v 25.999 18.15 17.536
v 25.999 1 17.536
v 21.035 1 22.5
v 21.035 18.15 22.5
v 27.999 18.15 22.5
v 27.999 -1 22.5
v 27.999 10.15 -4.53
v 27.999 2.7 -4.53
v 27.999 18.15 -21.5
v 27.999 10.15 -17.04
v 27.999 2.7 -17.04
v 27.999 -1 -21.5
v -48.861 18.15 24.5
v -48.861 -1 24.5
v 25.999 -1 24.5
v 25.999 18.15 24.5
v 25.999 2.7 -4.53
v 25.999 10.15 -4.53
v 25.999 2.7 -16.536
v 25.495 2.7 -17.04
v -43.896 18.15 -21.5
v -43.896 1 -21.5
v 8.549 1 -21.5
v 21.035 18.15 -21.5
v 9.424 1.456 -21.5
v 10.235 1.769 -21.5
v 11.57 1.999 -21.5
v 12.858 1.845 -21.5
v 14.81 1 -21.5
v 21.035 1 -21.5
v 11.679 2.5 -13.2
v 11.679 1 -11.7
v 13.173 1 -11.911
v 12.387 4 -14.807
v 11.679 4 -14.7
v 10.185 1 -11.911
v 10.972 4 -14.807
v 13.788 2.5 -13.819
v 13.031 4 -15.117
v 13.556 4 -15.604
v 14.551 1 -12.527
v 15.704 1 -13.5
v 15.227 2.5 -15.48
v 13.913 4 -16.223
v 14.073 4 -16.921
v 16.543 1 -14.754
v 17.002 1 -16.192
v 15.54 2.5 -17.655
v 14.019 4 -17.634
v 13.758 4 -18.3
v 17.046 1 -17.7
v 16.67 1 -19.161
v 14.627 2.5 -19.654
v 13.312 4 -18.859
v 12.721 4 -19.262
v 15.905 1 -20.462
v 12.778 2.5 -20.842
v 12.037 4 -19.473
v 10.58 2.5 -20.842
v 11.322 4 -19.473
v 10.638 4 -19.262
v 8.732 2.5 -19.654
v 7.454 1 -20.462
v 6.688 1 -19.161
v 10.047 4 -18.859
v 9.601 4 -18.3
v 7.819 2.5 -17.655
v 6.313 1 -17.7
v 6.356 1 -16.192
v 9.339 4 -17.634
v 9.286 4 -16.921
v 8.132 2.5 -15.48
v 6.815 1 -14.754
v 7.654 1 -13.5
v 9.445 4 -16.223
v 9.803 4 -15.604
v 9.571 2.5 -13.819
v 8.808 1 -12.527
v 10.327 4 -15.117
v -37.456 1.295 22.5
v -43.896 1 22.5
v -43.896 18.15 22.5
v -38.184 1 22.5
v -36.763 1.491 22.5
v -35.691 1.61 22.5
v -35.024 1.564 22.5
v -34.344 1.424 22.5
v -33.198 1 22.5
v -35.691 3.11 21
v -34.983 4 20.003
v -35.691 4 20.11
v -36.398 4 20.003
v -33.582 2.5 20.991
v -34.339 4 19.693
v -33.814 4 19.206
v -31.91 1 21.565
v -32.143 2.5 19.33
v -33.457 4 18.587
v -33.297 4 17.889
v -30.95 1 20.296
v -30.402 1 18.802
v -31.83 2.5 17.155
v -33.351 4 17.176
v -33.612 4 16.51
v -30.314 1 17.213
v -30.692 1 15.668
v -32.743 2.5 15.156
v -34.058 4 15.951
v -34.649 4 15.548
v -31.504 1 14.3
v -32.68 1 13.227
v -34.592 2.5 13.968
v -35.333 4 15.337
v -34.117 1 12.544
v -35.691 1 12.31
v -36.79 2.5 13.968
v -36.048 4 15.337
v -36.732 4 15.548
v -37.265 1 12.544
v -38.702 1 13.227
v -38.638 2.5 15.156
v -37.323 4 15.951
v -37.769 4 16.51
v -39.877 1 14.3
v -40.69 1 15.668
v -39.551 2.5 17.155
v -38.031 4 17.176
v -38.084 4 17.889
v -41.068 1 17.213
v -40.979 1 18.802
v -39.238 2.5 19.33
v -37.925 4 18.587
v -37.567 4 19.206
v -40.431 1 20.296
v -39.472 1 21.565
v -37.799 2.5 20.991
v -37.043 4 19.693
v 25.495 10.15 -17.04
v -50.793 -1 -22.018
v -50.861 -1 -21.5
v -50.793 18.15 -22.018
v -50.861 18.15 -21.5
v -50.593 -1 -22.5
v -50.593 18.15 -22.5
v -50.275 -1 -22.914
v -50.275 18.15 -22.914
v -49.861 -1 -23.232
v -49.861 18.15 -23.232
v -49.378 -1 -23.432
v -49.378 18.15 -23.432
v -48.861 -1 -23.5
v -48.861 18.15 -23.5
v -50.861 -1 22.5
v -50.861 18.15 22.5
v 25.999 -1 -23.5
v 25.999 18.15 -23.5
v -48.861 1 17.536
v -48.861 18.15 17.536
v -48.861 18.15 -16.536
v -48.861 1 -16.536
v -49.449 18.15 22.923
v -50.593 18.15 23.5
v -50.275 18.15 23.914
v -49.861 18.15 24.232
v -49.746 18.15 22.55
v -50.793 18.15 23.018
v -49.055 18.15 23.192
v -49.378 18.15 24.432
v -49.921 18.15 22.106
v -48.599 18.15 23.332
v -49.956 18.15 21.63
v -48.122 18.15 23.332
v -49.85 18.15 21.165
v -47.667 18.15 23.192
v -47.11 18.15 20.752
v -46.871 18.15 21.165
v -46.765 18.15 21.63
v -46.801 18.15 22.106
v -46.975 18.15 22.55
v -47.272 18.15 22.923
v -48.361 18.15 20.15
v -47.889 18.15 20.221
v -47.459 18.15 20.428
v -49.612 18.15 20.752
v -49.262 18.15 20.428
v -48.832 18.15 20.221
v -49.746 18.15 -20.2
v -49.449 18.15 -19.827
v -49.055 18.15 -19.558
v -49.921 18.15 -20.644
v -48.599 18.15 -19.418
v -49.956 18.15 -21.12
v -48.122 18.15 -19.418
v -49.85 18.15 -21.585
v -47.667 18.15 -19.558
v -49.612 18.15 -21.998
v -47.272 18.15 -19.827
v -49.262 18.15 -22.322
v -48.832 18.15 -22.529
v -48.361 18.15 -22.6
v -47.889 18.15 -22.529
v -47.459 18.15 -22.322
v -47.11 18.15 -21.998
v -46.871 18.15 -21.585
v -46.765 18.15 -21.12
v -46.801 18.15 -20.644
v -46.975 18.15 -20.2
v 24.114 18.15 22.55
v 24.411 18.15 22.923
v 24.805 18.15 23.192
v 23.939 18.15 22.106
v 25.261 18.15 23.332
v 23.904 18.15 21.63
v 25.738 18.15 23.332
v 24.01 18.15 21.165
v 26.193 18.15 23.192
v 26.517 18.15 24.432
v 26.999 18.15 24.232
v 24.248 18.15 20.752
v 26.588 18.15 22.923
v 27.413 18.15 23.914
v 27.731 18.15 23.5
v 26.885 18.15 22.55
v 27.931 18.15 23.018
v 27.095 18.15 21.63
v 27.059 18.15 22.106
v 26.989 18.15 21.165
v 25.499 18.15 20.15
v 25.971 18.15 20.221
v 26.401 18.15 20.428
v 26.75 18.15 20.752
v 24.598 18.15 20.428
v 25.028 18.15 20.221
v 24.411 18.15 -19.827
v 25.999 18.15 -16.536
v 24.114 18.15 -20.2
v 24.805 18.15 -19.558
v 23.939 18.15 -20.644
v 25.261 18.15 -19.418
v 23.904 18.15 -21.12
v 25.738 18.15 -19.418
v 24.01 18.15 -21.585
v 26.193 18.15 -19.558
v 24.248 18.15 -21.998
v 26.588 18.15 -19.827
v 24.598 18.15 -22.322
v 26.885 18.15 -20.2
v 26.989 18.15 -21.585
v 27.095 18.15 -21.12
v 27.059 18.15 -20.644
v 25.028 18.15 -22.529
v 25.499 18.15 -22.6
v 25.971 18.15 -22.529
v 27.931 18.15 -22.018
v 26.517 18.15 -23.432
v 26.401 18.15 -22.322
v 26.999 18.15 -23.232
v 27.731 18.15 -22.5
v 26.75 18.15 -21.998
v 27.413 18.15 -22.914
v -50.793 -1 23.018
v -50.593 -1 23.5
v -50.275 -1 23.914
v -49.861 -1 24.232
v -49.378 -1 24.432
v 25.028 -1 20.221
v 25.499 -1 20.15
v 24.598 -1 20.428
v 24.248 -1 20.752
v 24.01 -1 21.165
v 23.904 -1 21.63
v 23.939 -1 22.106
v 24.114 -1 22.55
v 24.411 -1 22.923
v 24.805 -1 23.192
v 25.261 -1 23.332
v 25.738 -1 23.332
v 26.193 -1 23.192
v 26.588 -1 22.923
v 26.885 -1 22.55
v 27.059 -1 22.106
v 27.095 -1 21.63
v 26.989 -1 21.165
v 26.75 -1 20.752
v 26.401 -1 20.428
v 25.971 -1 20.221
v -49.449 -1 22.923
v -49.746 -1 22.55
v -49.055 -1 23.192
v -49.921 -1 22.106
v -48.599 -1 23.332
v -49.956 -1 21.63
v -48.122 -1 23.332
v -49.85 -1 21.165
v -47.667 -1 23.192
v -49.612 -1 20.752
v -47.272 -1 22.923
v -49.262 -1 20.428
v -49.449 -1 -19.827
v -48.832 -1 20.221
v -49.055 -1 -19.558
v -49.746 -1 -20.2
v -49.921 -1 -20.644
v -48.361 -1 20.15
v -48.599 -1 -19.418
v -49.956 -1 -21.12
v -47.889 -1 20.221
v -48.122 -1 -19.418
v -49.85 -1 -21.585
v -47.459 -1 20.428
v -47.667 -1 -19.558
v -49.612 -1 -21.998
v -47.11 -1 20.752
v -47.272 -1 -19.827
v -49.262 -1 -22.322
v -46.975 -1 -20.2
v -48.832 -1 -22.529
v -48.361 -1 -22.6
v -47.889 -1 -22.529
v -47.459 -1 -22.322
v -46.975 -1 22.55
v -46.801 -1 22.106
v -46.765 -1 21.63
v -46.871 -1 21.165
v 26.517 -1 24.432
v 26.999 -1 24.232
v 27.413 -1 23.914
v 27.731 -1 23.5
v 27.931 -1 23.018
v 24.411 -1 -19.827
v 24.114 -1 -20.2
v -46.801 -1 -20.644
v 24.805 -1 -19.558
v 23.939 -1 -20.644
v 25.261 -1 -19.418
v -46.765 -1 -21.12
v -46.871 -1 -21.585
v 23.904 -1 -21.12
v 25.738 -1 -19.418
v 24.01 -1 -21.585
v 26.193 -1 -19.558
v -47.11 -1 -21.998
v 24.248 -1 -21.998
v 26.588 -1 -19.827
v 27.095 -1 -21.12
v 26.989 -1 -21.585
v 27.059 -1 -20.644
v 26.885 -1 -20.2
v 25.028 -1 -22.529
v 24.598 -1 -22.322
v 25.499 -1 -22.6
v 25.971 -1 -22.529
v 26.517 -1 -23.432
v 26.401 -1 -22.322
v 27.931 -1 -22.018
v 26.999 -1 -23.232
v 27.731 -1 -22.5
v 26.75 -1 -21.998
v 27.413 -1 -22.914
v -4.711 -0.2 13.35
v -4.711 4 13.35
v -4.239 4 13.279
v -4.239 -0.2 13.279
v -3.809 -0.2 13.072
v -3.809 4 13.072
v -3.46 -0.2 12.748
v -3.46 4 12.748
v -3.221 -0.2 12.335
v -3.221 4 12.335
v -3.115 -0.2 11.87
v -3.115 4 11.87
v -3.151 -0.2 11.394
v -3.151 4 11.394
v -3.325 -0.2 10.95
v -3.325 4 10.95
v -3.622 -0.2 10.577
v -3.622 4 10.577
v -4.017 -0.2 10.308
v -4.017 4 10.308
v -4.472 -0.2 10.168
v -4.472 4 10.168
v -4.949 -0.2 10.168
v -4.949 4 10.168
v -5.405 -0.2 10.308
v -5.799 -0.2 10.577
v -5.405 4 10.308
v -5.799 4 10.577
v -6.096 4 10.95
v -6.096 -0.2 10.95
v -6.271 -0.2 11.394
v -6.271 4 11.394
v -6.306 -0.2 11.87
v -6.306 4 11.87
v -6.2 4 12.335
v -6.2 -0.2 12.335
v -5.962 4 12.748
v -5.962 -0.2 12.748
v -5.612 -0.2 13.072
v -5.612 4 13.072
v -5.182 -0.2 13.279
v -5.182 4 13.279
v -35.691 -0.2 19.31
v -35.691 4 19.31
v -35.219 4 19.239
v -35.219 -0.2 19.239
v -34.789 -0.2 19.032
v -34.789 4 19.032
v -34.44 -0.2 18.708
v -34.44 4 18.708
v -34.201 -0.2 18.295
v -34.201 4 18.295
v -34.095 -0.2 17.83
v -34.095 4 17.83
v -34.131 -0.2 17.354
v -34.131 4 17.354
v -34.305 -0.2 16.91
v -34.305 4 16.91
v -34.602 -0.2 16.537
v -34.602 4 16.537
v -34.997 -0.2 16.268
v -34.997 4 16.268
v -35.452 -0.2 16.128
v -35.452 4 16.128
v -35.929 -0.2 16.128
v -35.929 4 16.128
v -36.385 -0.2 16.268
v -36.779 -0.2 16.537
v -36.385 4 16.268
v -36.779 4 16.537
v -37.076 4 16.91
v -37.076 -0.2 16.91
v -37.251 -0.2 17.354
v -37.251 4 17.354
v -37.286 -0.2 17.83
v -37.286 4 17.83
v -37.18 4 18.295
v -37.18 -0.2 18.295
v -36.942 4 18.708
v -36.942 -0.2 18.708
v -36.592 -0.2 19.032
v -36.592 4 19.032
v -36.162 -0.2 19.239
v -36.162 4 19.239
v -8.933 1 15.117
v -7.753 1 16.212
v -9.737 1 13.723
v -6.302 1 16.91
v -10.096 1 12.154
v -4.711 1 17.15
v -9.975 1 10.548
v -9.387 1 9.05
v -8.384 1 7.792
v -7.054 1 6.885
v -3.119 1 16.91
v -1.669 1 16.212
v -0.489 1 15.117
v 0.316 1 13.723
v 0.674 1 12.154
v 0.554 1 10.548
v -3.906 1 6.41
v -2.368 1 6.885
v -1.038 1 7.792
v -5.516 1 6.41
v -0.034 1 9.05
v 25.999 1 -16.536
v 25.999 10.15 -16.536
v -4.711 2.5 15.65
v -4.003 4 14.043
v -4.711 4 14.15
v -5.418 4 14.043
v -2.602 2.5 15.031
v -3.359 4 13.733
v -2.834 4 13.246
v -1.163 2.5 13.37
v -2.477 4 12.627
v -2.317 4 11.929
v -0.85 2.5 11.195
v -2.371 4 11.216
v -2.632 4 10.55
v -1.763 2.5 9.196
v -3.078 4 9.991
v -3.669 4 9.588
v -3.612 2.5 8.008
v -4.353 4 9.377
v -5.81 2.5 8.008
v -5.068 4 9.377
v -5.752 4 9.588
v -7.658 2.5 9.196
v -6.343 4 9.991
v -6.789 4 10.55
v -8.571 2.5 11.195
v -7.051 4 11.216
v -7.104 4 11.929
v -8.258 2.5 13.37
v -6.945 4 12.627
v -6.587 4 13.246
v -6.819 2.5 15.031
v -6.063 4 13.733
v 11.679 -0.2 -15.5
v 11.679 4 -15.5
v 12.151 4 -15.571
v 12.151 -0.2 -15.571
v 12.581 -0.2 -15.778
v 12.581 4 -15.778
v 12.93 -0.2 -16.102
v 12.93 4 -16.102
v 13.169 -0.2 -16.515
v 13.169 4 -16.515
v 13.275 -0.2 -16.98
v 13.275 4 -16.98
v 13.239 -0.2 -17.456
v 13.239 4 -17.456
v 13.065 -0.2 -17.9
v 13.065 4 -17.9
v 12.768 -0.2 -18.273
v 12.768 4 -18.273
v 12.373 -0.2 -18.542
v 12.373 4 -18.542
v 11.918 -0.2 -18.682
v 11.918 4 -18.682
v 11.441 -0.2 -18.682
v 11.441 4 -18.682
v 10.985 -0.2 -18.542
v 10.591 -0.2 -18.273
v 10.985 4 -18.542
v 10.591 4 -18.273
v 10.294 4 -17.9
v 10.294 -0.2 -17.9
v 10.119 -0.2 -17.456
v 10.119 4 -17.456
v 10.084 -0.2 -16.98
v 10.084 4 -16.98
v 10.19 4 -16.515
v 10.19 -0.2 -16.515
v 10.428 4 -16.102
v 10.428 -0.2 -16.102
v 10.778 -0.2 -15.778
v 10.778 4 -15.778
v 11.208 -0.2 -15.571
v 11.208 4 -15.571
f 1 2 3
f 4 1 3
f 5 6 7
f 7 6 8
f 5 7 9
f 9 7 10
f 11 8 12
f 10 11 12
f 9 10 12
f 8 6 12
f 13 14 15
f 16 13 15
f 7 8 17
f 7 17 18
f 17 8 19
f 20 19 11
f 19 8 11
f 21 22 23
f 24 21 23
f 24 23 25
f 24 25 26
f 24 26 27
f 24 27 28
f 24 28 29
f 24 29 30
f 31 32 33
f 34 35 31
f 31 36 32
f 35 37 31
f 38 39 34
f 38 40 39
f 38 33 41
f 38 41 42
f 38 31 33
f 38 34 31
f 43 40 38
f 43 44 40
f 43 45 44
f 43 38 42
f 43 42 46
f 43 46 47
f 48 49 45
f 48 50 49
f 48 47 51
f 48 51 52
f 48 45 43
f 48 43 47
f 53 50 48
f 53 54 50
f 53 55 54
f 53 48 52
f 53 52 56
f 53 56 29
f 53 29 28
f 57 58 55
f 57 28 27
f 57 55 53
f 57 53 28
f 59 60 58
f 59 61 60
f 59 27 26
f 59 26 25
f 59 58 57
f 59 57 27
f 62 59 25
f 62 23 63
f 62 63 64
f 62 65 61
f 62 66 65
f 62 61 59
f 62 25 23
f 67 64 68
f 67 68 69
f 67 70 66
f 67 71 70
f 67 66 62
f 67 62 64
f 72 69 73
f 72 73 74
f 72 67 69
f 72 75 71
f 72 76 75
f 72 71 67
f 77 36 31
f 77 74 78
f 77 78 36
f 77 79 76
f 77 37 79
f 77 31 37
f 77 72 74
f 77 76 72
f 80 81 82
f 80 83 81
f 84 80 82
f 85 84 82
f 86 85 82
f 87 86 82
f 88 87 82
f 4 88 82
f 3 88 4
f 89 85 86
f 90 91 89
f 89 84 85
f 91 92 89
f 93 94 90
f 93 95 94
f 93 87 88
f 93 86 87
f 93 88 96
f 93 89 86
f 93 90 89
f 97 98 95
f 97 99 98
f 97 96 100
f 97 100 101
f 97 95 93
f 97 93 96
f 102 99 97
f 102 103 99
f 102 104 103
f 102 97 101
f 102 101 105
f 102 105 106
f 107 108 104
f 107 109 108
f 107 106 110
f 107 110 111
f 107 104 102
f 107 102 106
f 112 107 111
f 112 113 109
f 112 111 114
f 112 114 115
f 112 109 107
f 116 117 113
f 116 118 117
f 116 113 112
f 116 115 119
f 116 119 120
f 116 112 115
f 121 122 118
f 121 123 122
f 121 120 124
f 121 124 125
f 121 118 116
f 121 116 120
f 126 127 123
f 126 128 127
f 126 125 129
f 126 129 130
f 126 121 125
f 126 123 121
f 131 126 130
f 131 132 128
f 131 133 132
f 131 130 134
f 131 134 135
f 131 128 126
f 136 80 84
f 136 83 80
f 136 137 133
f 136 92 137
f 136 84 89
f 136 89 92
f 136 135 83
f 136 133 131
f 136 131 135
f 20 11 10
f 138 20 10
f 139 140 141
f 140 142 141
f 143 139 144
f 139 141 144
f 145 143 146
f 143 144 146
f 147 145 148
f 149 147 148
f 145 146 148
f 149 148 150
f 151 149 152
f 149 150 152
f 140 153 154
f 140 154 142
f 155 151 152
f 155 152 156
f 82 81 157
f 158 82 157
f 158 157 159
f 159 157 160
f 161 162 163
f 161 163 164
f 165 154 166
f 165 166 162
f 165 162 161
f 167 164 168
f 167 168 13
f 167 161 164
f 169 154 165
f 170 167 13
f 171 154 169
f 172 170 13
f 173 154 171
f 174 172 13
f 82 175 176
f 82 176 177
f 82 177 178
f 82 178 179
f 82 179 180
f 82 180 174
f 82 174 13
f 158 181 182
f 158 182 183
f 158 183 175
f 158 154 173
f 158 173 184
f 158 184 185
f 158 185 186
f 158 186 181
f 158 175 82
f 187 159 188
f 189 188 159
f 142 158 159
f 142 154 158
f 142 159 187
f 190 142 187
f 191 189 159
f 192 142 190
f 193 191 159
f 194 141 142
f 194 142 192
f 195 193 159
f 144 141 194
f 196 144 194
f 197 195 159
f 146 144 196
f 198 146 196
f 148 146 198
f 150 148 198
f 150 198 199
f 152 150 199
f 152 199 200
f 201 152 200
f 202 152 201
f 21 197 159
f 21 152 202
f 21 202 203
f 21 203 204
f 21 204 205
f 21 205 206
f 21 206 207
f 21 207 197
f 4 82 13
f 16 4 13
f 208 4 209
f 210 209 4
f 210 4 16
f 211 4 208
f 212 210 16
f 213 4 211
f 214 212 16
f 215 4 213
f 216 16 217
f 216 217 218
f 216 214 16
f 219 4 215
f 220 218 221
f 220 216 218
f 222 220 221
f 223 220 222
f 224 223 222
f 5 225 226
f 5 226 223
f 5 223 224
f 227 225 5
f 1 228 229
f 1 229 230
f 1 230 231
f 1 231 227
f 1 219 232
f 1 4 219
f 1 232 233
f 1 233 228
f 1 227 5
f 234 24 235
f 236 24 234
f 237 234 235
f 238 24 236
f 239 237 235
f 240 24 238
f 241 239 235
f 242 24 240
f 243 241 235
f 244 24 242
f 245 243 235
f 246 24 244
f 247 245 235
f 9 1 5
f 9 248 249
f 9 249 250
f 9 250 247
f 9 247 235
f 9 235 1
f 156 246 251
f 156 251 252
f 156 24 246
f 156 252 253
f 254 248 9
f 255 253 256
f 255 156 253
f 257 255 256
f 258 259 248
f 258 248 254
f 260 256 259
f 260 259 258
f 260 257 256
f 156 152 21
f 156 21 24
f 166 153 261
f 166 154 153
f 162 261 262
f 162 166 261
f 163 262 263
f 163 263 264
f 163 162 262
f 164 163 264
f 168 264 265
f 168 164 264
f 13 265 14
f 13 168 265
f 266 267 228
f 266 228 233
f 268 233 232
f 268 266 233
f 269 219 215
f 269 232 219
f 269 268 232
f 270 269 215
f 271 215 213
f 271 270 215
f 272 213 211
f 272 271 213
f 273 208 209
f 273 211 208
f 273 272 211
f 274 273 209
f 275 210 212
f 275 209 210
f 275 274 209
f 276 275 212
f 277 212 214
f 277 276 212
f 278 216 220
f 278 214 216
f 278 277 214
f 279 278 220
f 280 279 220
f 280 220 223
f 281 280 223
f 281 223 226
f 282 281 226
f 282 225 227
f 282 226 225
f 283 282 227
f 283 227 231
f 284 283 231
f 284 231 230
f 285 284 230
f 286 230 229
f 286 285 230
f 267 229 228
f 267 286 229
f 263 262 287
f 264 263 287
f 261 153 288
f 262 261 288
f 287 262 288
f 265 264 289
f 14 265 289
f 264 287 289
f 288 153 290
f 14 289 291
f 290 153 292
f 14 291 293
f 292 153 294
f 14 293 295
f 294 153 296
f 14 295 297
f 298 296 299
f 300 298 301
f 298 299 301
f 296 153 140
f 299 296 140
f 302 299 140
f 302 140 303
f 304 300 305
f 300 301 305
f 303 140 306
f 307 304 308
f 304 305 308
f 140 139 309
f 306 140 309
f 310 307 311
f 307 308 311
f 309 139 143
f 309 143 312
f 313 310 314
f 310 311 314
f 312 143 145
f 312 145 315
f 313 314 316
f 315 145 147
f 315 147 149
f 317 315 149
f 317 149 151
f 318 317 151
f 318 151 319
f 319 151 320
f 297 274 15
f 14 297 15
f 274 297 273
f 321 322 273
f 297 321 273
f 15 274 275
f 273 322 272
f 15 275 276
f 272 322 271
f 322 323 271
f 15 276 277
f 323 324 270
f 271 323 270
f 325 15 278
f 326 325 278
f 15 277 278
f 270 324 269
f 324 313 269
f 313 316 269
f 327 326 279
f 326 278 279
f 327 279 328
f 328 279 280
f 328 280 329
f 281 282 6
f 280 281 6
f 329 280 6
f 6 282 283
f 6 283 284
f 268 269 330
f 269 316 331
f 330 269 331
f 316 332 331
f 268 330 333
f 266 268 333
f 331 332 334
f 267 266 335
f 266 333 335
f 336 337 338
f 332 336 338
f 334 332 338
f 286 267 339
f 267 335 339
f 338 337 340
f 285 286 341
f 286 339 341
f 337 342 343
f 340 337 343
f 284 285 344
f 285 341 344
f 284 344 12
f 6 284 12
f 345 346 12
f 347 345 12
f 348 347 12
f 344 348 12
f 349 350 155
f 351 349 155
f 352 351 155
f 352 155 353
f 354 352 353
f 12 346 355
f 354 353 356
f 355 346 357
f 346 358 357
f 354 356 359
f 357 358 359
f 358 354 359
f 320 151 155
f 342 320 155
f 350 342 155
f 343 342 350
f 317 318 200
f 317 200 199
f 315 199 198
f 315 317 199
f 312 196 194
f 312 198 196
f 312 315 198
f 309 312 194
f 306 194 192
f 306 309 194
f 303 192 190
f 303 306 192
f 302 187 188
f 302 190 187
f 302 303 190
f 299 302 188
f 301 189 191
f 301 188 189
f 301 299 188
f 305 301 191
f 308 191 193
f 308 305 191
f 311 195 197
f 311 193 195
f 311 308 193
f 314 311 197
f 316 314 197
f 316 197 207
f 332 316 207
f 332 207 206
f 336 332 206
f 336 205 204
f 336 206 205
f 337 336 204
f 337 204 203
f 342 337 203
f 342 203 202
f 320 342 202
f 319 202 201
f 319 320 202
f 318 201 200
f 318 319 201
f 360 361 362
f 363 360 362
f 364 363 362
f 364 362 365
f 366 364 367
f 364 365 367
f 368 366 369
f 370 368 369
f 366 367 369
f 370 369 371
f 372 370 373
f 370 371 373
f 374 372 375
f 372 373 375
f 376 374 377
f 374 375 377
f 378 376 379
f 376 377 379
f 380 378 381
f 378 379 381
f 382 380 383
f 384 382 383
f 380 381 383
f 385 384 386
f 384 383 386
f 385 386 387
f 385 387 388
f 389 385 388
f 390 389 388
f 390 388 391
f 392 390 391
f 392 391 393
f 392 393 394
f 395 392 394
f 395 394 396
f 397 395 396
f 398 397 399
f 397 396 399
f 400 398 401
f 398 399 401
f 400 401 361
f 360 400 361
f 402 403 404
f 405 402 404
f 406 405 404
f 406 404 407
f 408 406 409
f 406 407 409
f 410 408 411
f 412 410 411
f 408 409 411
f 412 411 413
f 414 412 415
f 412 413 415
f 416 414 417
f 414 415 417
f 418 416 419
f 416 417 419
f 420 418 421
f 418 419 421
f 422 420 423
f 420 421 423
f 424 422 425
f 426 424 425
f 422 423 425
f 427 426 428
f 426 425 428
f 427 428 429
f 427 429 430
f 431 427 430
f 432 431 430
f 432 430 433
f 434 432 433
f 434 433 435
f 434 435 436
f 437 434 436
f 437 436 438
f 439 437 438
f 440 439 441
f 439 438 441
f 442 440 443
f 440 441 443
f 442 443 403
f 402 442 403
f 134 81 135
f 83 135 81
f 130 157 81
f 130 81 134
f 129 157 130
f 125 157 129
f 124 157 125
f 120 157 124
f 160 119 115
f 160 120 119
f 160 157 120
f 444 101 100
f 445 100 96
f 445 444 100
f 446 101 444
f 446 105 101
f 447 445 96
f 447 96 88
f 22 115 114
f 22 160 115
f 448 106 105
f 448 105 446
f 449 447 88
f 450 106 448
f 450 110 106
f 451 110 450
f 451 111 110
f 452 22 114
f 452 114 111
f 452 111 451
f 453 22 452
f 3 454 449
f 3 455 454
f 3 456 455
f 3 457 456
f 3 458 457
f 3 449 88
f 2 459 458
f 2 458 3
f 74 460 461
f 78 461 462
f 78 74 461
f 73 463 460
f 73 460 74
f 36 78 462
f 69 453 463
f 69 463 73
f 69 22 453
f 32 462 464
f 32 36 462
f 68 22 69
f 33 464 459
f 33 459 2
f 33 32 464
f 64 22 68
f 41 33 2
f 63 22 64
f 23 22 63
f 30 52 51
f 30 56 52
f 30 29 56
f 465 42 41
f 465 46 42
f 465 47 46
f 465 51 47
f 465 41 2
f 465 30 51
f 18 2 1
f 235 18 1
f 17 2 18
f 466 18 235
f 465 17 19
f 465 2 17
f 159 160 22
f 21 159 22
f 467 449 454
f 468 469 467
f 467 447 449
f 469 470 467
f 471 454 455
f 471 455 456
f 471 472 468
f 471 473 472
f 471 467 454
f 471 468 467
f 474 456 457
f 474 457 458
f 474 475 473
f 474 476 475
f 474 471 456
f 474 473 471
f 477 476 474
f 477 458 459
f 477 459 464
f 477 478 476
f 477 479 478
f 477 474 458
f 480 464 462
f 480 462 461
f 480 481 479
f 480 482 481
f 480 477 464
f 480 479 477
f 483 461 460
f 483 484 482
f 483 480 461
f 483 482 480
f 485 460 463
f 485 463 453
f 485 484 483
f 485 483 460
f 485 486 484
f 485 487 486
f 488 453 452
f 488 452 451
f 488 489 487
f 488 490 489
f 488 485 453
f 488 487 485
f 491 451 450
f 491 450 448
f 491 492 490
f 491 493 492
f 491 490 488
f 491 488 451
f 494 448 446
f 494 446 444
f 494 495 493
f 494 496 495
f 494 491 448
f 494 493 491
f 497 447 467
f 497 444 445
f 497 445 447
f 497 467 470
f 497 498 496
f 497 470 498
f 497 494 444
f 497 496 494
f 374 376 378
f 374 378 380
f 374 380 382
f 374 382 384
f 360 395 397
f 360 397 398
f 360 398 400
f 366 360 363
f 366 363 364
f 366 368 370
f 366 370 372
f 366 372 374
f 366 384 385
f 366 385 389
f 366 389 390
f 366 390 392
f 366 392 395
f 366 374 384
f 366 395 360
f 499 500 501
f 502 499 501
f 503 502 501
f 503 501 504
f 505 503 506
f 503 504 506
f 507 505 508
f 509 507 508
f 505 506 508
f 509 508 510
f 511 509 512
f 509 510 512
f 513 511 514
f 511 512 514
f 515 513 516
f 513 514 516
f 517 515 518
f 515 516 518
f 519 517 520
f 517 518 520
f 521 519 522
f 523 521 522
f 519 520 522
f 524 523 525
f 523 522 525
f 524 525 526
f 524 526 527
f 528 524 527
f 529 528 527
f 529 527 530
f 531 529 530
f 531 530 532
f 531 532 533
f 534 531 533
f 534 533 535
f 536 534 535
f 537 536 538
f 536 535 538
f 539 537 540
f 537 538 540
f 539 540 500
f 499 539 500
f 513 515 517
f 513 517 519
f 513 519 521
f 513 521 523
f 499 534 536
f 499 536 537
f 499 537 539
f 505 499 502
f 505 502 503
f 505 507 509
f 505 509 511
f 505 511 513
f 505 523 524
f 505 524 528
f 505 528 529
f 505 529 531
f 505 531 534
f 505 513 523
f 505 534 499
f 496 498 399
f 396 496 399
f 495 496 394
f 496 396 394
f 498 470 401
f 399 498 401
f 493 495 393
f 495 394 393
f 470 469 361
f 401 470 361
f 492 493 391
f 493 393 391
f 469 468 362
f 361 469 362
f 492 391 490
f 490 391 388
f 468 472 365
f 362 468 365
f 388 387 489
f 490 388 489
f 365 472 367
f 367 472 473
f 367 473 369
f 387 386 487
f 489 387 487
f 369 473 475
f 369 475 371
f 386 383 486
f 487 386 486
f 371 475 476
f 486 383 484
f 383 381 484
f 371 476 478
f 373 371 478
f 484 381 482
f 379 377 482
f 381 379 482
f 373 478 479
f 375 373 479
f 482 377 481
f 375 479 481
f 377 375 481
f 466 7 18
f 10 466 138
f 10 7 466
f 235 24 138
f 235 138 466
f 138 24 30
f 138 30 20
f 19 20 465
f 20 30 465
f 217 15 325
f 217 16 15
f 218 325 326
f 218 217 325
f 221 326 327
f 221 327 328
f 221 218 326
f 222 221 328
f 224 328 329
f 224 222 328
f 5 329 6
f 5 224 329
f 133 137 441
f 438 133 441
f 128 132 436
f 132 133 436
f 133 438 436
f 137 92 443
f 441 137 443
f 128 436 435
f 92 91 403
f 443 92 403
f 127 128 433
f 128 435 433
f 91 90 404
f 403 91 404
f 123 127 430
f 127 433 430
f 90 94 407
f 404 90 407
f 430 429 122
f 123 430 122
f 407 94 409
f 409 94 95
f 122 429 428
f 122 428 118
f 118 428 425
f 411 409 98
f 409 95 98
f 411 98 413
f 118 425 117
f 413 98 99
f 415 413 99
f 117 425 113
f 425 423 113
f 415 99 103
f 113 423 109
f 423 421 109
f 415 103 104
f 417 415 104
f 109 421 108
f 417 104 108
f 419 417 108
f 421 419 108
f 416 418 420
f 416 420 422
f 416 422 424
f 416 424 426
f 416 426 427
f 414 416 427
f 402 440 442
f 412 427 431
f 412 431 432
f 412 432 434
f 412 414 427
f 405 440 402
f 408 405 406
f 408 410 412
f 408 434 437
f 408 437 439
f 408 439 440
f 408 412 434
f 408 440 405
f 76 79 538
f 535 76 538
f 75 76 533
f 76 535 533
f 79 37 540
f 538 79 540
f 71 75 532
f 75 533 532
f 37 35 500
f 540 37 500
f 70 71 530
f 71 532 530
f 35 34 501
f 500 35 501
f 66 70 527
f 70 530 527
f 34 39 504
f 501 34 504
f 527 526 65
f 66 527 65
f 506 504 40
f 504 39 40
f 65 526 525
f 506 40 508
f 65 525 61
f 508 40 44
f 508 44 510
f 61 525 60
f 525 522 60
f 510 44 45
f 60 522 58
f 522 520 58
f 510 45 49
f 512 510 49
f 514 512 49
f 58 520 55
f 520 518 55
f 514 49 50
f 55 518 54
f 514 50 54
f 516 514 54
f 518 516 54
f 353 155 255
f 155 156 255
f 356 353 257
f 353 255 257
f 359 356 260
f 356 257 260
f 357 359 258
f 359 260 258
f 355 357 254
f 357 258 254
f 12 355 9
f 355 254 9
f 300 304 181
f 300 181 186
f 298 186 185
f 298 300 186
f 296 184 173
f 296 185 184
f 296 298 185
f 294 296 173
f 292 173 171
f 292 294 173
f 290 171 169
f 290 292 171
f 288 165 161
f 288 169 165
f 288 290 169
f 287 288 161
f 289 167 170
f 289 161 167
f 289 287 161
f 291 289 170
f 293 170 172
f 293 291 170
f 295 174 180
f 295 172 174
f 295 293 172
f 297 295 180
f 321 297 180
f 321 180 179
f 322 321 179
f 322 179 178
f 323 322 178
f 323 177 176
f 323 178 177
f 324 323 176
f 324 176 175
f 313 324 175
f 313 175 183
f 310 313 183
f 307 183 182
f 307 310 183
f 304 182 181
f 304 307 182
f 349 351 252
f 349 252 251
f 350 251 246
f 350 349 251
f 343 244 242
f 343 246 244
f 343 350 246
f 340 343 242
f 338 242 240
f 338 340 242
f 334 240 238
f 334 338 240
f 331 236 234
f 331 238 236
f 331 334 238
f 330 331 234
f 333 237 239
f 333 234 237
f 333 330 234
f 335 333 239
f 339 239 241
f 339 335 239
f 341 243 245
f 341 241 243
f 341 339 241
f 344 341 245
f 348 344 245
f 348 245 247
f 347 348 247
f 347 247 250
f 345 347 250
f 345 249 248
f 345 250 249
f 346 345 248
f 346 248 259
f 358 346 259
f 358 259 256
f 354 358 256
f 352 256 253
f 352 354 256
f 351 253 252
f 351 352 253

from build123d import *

# Parameters (mm, degrees)
BOSS_EXTRUDE1_DEPTH      = 18.15
BOSS_EXTRUDE1_DEPTH_BACK = 1
SKETCH1_W                = 78.86
SKETCH1_H                = 48
SHELL1_T                 = -2
BOSS_EXTRUDE2_START      = 3
SKETCH4_R                = 2
BOSS_EXTRUDE2_DEPTH      = 4.4
CHAMFER2_SIZE            = 3.4
CHAMFER3_SIZE            = 3.4
CHAMFER4_SIZE            = 3.4
BOSS_EXTRUDE4_DEPTH      = 17.15
CUT_EXTRUDE4_DEPTH       = 60.613659429
CUT_EXTRUDE4_DEPTH_BACK  = 22
SKETCH14_R               = 1.6
FILLET1_R                = 2
CUT_EXTRUDE9_REACH       = 86.549
SKETCH17_W               = 12.51
SKETCH17_H               = 7.45
SKETCH21_R               = 1.6
CUT_EXTRUDE10_DEPTH      = 4.2


with BuildPart() as part:
    # Sketch1 → Boss-Extrude1 (new, two sides: drawn at the far end of the back side and taken through both)
    with BuildSketch(Plane(origin=(0, 0, 0), x_dir=(1, 0, 0), z_dir=(0, 1, 0)).offset(-BOSS_EXTRUDE1_DEPTH_BACK)):
        with Locations((-11.43075, -0.5)):
            Rectangle(SKETCH1_W, SKETCH1_H)
    extrude(amount=BOSS_EXTRUDE1_DEPTH + BOSS_EXTRUDE1_DEPTH_BACK)

    # Shell1
    shell1_openings = [part.faces().sort_by_distance(p)[0] for p in [
        (-11.43075, 18.15, 0.5),
    ]]
    offset(amount=SHELL1_T, openings=shell1_openings, kind=Kind.INTERSECTION)

    # Sketch4 → Boss-Extrude2 (add)
    with BuildSketch(Plane(origin=(0, 1, 0), x_dir=(1, 0, 0), z_dir=(0, 1, 0)).offset(BOSS_EXTRUDE2_START)):
        with Locations(Location((-35.69075, -17.71, 0), (0, 0, 270))):
            Circle(SKETCH4_R)
        with Locations(Location((-4.71075, -11.75, 0), (0, 0, 270))):
            Circle(SKETCH4_R)
        with Locations(Location((11.67925, 17.1, 0), (0, 0, 270))):
            Circle(SKETCH4_R)
    extrude(amount=-BOSS_EXTRUDE2_DEPTH)

    # Chamfer2
    # the kernel refuses this chamfer: 3.4 mm, written as the material it adds along each edge
    with BuildSketch(Plane(origin=(-4.71075, 1, 11.75), x_dir=(0, 0, 1), z_dir=(-1, 0, 0))) as chamfer2_piece_1_section:
        Polygon((2 + CHAMFER2_SIZE, 0), (2, CHAMFER2_SIZE), (2, 0), align=None)
    chamfer2_piece_1 = revolve(axis=Axis((-4.71075, 1, 11.75), (0, 1, 0)), mode=Mode.PRIVATE)
    chamfer2_piece_1 = split(chamfer2_piece_1, bisect_by=Plane(origin=(-4.71075, 4, 7.837068743), z_dir=(0, -1, 0)), keep=Keep.TOP, mode=Mode.PRIVATE)
    add(chamfer2_piece_1)

    # Chamfer3
    # the kernel refuses this chamfer: 3.4 mm, written as the material it adds along each edge
    with BuildSketch(Plane(origin=(11.67925, 1, -17.1), x_dir=(0, 0, 1), z_dir=(-1, 0, 0))) as chamfer3_piece_1_section:
        Polygon((2 + CHAMFER3_SIZE, 0), (2, CHAMFER3_SIZE), (2, 0), align=None)
    chamfer3_piece_1 = revolve(axis=Axis((11.67925, 1, -17.1), (0, 1, 0)), mode=Mode.PRIVATE)
    chamfer3_piece_1 = split(chamfer3_piece_1, bisect_by=Plane(origin=(11.67925, 4, -21.012931257), z_dir=(0, -1, 0)), keep=Keep.TOP, mode=Mode.PRIVATE)
    add(chamfer3_piece_1)

    # Chamfer4
    # the kernel refuses this chamfer: 3.4 mm, written as the material it adds along each edge
    with BuildSketch(Plane(origin=(-35.69075, 1, 17.71), x_dir=(0, 0, 1), z_dir=(-1, 0, 0))) as chamfer4_piece_1_section:
        Polygon((2 + CHAMFER4_SIZE, 0), (2, CHAMFER4_SIZE), (2, 0), align=None)
    chamfer4_piece_1 = revolve(axis=Axis((-35.69075, 1, 17.71), (0, 1, 0)), mode=Mode.PRIVATE)
    chamfer4_piece_1 = split(chamfer4_piece_1, bisect_by=Plane(origin=(-35.69075, 4, 13.797068743), z_dir=(0, -1, 0)), keep=Keep.TOP, mode=Mode.PRIVATE)
    add(chamfer4_piece_1)

    # Sketch9 → Boss-Extrude4 (add)
    with BuildSketch(Plane(origin=(0, 1, 0), x_dir=(1, 0, 0), z_dir=(0, 1, 0))):
        Polygon((-48.86075, 16.53575), (-43.8965, 21.5), (-48.86075, 21.5), align=None)
        Polygon((21.035, 21.5), (25.99925, 16.53575), (25.99925, 21.5), align=None)
        Polygon((25.99925, -17.53575), (21.035, -22.5), (25.99925, -22.5), align=None)
        Polygon((-43.8965, -22.5), (-48.86075, -17.53575), (-48.86075, -22.5), align=None)
    extrude(amount=BOSS_EXTRUDE4_DEPTH)

    # Sketch14 → Cut-Extrude4 (cut, two sides: drawn at the far end of the back side and taken through both)
    with BuildSketch(Plane(origin=(0, 18.15, 0), x_dir=(1, 0, 0), z_dir=(0, 1, 0)).offset(-CUT_EXTRUDE4_DEPTH_BACK)):
        with Locations(Location((-48.36075, 21, 0), (0, 0, 90))):
            Circle(SKETCH14_R)
        with Locations(Location((25.49925, 21, 0), (0, 0, 90))):
            Circle(SKETCH14_R)
        with Locations(Location((25.49925, -21.75, 0), (0, 0, 90))):
            Circle(SKETCH14_R)
        with Locations(Location((-48.36075, -21.75, 0), (0, 0, 90))):
            Circle(SKETCH14_R)
    extrude(amount=CUT_EXTRUDE4_DEPTH + CUT_EXTRUDE4_DEPTH_BACK, mode=Mode.SUBTRACT)

    # Fillet1
    fillet1_edges = [part.edges().sort_by_distance(p)[0] for p in [
        (-50.86075, 8.575, -23.5),
        (27.99925, 8.575, -23.5),
        (27.99925, 8.575, 24.5),
        (-50.86075, 8.575, 24.5),
    ]]
    fillet(fillet1_edges, radius=FILLET1_R)

    # Sketch17 → Cut-Extrude9 (cut, up to next)
    with BuildSketch(Plane(origin=(27.99925, 0, 0), x_dir=(0, 0, -1), z_dir=(1, 0, 0)), mode=Mode.PRIVATE) as cut_extrude9_sk1:
        with Locations((10.785, 6.425)):
            Rectangle(SKETCH17_W, SKETCH17_H)
    cut_extrude9_tool1 = extrude(cut_extrude9_sk1.sketch, amount=-CUT_EXTRUDE9_REACH, mode=Mode.PRIVATE) & part.part
    add(cut_extrude9_tool1.solids().sort_by_distance((27.99925, 6.425, -10.785))[0], mode=Mode.SUBTRACT)

    # Sketch21 → Cut-Extrude10 (cut)
    with BuildSketch(Plane(origin=(0, 4, 0), x_dir=(1, 0, 0), z_dir=(0, 1, 0))):
        with Locations(Location((11.67925, 17.1, 0), (0, 0, 270))):
            Circle(SKETCH21_R)
        with Locations(Location((-4.71075, -11.75, 0), (0, 0, 270))):
            Circle(SKETCH21_R)
        with Locations(Location((-35.69075, -17.71, 0), (0, 0, 270))):
            Circle(SKETCH21_R)
    extrude(amount=-CUT_EXTRUDE10_DEPTH, mode=Mode.SUBTRACT)


solid = part.part
